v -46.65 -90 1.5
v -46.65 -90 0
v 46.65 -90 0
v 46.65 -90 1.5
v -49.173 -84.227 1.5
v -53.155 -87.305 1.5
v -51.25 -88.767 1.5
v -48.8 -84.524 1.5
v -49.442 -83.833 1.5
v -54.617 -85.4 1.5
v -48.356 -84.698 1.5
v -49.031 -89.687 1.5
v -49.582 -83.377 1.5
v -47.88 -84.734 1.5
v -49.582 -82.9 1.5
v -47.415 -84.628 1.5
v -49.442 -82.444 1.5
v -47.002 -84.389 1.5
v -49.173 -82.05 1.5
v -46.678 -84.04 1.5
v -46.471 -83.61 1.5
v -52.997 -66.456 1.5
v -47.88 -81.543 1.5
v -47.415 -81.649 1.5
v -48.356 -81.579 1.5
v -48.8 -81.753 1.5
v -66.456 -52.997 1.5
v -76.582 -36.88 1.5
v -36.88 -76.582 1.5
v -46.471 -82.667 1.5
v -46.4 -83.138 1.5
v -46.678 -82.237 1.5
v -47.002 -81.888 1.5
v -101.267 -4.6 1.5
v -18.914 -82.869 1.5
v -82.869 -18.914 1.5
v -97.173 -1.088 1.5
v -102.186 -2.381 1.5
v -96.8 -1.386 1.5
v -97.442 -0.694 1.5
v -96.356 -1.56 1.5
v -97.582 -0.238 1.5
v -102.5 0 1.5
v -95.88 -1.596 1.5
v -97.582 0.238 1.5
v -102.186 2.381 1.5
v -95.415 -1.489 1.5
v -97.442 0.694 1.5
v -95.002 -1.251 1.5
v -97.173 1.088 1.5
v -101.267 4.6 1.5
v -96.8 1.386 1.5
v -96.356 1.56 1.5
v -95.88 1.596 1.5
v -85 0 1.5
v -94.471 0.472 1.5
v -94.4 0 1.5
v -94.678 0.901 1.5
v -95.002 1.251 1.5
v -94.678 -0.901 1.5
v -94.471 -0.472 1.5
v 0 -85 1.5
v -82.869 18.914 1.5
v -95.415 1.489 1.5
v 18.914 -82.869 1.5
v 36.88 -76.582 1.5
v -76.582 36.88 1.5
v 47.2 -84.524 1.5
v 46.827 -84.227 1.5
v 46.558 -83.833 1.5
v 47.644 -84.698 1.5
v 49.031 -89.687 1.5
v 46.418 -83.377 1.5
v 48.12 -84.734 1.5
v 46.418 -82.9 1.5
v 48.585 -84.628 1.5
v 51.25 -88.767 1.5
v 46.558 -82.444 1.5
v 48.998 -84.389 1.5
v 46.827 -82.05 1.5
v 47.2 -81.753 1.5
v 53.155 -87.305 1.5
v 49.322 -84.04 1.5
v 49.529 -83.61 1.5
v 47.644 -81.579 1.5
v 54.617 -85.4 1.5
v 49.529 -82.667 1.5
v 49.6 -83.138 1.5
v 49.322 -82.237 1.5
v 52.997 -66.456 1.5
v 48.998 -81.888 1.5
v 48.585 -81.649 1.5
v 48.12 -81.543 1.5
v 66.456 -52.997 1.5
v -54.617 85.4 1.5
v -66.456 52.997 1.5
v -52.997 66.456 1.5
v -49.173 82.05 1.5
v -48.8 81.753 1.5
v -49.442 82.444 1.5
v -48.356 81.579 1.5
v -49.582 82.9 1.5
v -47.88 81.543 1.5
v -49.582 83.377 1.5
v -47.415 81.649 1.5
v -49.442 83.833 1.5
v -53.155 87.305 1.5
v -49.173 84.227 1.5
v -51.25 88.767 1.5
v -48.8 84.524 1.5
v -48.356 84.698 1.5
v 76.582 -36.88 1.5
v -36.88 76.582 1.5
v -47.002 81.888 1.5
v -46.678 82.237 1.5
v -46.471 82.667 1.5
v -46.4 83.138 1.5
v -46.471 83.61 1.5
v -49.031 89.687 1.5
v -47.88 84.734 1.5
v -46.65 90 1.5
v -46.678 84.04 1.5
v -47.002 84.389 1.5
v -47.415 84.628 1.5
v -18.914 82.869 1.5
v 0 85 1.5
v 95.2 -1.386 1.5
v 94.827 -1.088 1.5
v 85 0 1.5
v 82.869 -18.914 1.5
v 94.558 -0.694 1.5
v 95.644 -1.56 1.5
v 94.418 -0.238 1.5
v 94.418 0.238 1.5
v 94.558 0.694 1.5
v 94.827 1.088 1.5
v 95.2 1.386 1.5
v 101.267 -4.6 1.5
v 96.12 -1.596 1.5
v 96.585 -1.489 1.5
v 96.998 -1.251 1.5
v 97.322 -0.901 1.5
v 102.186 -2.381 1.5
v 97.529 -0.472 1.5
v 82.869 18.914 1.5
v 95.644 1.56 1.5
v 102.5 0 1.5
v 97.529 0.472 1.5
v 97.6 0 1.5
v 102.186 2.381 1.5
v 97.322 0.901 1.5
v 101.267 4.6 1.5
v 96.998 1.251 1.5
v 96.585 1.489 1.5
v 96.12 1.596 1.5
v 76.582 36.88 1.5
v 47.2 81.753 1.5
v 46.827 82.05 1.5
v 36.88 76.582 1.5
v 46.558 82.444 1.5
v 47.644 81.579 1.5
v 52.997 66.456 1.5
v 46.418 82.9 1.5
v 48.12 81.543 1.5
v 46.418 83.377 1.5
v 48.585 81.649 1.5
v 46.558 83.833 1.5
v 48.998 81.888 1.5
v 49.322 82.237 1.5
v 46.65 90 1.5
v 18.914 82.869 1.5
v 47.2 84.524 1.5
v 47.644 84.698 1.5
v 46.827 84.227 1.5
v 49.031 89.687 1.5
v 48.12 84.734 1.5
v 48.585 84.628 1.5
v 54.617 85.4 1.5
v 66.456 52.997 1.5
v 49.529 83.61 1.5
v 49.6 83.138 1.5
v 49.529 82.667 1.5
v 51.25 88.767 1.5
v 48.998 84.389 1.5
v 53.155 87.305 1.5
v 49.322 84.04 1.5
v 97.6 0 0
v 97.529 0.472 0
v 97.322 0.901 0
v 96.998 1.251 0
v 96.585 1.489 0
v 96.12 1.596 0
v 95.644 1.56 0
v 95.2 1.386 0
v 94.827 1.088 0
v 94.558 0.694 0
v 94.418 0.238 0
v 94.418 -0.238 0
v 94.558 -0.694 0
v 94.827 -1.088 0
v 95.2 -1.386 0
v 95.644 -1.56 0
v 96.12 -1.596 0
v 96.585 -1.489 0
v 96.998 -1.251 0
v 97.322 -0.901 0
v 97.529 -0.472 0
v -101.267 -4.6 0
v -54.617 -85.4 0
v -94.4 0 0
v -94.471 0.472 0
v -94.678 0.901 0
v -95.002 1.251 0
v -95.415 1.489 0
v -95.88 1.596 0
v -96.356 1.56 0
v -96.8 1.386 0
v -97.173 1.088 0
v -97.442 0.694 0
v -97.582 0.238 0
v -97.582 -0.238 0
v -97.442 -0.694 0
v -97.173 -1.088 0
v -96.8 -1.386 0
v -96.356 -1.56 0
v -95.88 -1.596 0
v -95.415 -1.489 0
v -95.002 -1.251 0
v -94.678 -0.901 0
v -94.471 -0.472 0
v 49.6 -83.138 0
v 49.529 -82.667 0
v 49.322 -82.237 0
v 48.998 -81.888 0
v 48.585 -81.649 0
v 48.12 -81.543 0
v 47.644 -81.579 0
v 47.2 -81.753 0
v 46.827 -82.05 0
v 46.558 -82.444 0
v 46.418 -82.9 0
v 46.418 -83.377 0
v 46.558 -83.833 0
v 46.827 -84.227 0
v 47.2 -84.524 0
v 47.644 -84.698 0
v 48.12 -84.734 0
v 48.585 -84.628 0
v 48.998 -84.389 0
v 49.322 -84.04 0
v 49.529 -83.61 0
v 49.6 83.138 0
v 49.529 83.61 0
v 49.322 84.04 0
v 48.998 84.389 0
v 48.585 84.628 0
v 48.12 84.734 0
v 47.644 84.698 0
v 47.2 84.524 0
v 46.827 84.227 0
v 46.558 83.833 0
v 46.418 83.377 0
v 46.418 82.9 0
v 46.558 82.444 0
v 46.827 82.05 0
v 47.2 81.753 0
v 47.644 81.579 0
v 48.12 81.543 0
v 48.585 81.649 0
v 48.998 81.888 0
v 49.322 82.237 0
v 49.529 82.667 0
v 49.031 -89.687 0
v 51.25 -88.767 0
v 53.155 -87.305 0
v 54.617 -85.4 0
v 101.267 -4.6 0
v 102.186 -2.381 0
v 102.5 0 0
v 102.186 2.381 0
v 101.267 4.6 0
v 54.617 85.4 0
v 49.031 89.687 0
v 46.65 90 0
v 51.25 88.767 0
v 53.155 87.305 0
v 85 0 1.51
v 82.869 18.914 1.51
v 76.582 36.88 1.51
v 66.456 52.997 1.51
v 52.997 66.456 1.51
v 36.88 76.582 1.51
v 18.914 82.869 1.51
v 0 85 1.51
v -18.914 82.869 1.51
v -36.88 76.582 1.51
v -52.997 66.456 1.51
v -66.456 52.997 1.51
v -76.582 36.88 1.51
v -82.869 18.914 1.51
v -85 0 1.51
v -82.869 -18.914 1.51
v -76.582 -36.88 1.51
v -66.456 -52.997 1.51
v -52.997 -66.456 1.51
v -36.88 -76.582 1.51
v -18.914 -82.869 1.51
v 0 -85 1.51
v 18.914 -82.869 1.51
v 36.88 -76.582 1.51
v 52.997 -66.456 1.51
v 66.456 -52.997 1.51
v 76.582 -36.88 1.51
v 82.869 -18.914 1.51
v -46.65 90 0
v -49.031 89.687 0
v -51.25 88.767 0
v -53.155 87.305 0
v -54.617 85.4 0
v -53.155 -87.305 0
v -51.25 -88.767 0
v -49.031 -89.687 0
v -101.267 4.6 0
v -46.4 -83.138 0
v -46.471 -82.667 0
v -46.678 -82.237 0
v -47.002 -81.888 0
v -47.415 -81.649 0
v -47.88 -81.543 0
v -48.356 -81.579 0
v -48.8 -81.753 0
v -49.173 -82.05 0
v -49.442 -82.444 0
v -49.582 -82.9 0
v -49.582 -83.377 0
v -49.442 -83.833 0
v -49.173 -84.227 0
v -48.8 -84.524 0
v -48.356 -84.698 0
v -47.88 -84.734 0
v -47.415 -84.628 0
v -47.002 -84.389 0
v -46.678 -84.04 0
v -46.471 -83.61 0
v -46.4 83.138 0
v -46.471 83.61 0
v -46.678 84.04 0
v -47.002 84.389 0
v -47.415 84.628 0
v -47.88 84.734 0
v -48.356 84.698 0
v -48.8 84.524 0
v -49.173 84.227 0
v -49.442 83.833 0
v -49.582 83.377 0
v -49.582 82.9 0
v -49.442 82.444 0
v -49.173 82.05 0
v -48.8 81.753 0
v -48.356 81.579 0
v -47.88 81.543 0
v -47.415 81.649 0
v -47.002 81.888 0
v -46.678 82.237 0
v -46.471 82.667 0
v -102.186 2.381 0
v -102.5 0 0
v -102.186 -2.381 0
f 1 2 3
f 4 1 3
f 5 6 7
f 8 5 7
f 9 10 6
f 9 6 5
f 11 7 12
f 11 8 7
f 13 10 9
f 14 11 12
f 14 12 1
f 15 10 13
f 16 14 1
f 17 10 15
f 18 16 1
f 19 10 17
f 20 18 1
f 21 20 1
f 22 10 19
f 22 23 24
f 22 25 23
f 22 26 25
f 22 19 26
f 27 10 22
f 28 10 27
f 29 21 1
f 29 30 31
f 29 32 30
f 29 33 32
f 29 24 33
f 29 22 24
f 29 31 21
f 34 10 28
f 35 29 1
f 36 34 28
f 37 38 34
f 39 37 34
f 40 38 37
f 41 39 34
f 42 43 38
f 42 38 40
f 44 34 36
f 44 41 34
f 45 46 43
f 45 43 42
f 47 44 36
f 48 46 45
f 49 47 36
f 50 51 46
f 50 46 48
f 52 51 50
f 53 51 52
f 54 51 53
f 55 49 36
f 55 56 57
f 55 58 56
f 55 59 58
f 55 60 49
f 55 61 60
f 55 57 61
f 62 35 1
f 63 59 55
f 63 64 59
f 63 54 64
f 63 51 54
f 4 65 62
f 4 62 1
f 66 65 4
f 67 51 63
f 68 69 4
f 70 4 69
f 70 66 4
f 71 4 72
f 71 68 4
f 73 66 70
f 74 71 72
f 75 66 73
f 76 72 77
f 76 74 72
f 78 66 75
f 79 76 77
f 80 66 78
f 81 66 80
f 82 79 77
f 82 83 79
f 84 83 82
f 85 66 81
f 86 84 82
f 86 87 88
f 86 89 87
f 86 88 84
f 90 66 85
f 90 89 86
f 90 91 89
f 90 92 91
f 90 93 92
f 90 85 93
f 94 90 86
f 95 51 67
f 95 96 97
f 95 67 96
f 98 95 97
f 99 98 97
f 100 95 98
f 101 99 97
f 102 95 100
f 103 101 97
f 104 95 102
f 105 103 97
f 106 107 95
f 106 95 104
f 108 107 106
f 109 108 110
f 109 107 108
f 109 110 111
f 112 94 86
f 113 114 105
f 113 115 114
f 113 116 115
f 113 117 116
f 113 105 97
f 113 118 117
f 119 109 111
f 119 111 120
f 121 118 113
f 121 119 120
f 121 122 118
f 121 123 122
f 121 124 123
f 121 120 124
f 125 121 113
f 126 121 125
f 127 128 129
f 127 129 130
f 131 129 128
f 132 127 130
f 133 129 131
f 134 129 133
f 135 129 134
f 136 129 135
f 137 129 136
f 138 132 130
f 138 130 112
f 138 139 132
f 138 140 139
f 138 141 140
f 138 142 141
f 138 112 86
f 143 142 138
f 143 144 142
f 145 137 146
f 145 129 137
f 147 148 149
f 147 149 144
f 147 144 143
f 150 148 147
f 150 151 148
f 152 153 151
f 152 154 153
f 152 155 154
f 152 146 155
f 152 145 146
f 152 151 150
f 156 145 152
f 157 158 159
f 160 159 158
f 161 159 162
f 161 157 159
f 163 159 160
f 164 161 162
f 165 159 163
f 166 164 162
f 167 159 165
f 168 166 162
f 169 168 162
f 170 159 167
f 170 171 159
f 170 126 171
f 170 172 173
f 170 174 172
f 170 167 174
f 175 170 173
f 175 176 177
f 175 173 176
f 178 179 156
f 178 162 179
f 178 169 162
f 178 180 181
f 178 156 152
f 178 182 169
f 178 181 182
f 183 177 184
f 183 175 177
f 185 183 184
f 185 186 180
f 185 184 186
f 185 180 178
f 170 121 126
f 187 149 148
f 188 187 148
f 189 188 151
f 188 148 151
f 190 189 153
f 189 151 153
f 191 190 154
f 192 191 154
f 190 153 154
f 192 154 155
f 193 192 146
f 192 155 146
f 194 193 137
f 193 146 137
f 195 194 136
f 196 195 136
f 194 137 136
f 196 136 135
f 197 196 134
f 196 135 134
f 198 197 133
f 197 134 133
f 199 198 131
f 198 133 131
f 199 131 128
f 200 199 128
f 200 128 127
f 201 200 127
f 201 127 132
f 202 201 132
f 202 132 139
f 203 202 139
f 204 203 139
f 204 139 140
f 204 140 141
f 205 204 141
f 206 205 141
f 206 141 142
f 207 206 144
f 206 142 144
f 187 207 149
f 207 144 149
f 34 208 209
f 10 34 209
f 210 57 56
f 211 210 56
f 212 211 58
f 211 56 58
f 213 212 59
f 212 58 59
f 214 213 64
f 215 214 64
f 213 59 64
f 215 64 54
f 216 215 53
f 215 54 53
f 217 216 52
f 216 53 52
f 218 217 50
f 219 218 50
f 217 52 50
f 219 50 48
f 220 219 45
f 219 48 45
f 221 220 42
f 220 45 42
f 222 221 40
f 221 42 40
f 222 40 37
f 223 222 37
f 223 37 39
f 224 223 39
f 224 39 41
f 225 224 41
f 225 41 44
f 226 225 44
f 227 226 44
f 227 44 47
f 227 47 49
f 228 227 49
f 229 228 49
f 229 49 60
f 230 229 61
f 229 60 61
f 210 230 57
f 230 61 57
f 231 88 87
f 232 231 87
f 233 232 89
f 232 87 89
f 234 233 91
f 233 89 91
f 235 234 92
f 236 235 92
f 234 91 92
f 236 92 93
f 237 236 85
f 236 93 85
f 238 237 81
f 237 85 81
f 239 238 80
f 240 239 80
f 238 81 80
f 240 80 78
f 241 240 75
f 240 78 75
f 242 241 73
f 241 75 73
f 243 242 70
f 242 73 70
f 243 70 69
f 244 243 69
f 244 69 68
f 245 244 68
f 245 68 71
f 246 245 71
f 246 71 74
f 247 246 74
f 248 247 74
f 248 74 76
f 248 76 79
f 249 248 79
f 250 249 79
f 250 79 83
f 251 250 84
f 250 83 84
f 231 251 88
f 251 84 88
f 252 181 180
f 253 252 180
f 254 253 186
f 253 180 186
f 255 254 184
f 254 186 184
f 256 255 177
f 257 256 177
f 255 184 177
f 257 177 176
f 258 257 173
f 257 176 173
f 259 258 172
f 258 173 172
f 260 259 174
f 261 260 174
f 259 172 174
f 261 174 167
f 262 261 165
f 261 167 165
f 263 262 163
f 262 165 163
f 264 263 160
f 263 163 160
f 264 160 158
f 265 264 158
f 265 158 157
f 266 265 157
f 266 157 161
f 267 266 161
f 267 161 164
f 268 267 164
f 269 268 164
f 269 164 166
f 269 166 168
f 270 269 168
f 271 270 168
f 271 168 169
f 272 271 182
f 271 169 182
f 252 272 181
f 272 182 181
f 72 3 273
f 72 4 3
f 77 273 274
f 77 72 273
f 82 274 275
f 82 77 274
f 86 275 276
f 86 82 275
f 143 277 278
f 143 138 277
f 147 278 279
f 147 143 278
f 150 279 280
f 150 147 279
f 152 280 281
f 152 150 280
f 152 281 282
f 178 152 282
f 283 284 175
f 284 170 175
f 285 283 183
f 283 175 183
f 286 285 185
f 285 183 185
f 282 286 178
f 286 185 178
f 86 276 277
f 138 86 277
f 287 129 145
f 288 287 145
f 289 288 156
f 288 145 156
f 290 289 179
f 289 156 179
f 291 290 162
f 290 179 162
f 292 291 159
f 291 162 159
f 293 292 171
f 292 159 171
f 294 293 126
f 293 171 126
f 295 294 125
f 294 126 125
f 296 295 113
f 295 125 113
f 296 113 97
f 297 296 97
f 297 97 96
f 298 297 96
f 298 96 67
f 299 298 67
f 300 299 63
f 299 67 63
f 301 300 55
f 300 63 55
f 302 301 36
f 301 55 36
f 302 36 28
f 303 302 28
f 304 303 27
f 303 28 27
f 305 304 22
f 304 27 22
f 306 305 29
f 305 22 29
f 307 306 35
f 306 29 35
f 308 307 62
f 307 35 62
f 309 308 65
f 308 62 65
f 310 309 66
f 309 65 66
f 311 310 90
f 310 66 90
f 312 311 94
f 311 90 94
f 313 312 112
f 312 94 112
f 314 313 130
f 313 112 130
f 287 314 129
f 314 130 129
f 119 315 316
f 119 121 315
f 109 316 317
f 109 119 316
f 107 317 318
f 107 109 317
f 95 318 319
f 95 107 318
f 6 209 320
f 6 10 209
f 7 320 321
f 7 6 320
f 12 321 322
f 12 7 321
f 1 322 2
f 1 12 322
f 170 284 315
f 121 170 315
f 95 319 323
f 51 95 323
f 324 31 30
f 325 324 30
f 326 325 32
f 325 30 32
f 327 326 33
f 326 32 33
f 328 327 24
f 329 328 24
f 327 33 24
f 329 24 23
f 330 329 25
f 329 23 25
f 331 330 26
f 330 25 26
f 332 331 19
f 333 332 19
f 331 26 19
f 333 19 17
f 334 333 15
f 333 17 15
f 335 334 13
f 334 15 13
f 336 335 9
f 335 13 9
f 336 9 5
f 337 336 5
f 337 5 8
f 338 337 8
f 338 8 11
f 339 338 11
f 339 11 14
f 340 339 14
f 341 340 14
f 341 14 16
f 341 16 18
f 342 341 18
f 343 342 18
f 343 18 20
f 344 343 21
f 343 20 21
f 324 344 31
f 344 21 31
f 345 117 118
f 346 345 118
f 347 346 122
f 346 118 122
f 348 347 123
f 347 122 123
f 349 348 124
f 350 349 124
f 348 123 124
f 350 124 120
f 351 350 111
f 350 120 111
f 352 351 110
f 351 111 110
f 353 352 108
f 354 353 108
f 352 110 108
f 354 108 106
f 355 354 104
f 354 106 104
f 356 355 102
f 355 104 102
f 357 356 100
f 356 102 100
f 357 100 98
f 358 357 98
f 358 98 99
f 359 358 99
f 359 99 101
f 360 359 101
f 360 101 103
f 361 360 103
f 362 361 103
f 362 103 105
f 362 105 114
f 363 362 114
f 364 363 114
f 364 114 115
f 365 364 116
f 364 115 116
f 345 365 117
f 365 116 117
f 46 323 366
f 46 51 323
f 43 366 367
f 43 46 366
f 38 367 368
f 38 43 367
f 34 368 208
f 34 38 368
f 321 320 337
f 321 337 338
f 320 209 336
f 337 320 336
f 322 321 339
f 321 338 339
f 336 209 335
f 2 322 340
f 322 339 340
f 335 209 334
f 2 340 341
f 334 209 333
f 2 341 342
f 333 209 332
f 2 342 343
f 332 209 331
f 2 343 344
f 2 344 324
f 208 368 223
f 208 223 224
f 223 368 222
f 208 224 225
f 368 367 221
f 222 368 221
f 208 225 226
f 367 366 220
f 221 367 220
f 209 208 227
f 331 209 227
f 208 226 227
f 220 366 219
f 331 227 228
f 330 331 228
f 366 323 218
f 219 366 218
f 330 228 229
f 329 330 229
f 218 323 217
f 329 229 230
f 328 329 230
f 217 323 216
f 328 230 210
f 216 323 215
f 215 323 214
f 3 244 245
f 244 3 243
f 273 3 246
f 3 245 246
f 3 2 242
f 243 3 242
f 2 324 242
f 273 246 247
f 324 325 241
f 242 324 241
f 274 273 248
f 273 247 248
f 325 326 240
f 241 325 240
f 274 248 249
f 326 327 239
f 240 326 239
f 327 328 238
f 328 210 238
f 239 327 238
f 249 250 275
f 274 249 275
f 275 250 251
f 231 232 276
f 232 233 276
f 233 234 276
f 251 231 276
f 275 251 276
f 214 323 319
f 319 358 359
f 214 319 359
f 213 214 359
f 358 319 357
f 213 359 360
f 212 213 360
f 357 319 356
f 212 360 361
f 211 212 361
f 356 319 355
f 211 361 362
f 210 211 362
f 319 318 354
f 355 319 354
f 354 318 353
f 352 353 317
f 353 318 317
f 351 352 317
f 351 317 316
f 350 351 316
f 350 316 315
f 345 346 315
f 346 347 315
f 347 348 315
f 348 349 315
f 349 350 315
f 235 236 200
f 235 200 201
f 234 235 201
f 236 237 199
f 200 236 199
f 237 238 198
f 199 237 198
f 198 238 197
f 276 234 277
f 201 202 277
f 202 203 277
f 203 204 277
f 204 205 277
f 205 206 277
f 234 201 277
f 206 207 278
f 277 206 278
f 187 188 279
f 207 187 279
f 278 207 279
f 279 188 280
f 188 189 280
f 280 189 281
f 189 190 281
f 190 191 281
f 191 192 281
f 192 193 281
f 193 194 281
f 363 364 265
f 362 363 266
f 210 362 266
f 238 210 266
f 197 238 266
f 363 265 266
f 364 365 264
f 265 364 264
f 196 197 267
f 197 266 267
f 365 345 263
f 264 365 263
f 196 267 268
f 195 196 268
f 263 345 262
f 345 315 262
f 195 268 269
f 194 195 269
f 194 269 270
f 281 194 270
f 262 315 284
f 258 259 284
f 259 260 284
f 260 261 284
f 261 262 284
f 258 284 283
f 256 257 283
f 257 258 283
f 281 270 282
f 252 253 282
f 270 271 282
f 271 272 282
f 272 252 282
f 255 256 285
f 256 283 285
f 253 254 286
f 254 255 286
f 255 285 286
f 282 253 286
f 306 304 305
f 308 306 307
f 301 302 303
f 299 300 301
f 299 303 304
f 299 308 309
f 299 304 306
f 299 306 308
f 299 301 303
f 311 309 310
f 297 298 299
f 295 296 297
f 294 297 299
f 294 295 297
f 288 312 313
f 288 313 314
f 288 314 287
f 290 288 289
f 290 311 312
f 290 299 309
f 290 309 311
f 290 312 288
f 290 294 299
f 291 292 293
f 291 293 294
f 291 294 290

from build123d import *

# Parameters (mm, degrees)
F1_DEPTH = 1.5
F2_R     = 9.2
F3_R     = 85
F4_DEPTH = 0.01
F5_R     = 1.6
F6_DEPTH = 1.5


with BuildPart() as f1:
    # F0 (on Top) → F1 (new body)
    with BuildSketch(Plane.XY):
        Polygon((51.961524, 90), (-51.961524, 90), (-103.923048, 0), (-51.961524, -90), (51.961524, -90), (103.923048, 0), align=None)
    extrude(amount=F1_DEPTH)

    # F2
    f2_edges = [f1.edges().sort_by_distance(p)[0] for p in [
        (-103.923048, 0, 0.75),
        (-51.961524, 90, 0.75),
        (51.961524, 90, 0.75),
        (103.923048, 0, 0.75),
        (51.961524, -90, 0.75),
        (-51.961524, -90, 0.75),
    ]]
    fillet(f2_edges, radius=F2_R)

    # F3 (on face) → F4 (join)
    with BuildSketch(Plane.XY.offset(1.5)):
        Circle(F3_R)
    extrude(amount=F4_DEPTH)

    # F5 (on face) → F6 (cut, through all)
    with BuildSketch(Plane.XY.offset(1.5)):
        with Locations((96, 0)):
            Circle(F5_R)
        with Locations((48, 83.138439)):
            Circle(F5_R)
        with Locations((-48, 83.138439)):
            Circle(F5_R)
        with Locations((-96, 0)):
            Circle(F5_R)
        with Locations((-48, -83.138439)):
            Circle(F5_R)
        with Locations((48, -83.138439)):
            Circle(F5_R)
    extrude(amount=-F6_DEPTH, mode=Mode.SUBTRACT)


solid = f1.part
